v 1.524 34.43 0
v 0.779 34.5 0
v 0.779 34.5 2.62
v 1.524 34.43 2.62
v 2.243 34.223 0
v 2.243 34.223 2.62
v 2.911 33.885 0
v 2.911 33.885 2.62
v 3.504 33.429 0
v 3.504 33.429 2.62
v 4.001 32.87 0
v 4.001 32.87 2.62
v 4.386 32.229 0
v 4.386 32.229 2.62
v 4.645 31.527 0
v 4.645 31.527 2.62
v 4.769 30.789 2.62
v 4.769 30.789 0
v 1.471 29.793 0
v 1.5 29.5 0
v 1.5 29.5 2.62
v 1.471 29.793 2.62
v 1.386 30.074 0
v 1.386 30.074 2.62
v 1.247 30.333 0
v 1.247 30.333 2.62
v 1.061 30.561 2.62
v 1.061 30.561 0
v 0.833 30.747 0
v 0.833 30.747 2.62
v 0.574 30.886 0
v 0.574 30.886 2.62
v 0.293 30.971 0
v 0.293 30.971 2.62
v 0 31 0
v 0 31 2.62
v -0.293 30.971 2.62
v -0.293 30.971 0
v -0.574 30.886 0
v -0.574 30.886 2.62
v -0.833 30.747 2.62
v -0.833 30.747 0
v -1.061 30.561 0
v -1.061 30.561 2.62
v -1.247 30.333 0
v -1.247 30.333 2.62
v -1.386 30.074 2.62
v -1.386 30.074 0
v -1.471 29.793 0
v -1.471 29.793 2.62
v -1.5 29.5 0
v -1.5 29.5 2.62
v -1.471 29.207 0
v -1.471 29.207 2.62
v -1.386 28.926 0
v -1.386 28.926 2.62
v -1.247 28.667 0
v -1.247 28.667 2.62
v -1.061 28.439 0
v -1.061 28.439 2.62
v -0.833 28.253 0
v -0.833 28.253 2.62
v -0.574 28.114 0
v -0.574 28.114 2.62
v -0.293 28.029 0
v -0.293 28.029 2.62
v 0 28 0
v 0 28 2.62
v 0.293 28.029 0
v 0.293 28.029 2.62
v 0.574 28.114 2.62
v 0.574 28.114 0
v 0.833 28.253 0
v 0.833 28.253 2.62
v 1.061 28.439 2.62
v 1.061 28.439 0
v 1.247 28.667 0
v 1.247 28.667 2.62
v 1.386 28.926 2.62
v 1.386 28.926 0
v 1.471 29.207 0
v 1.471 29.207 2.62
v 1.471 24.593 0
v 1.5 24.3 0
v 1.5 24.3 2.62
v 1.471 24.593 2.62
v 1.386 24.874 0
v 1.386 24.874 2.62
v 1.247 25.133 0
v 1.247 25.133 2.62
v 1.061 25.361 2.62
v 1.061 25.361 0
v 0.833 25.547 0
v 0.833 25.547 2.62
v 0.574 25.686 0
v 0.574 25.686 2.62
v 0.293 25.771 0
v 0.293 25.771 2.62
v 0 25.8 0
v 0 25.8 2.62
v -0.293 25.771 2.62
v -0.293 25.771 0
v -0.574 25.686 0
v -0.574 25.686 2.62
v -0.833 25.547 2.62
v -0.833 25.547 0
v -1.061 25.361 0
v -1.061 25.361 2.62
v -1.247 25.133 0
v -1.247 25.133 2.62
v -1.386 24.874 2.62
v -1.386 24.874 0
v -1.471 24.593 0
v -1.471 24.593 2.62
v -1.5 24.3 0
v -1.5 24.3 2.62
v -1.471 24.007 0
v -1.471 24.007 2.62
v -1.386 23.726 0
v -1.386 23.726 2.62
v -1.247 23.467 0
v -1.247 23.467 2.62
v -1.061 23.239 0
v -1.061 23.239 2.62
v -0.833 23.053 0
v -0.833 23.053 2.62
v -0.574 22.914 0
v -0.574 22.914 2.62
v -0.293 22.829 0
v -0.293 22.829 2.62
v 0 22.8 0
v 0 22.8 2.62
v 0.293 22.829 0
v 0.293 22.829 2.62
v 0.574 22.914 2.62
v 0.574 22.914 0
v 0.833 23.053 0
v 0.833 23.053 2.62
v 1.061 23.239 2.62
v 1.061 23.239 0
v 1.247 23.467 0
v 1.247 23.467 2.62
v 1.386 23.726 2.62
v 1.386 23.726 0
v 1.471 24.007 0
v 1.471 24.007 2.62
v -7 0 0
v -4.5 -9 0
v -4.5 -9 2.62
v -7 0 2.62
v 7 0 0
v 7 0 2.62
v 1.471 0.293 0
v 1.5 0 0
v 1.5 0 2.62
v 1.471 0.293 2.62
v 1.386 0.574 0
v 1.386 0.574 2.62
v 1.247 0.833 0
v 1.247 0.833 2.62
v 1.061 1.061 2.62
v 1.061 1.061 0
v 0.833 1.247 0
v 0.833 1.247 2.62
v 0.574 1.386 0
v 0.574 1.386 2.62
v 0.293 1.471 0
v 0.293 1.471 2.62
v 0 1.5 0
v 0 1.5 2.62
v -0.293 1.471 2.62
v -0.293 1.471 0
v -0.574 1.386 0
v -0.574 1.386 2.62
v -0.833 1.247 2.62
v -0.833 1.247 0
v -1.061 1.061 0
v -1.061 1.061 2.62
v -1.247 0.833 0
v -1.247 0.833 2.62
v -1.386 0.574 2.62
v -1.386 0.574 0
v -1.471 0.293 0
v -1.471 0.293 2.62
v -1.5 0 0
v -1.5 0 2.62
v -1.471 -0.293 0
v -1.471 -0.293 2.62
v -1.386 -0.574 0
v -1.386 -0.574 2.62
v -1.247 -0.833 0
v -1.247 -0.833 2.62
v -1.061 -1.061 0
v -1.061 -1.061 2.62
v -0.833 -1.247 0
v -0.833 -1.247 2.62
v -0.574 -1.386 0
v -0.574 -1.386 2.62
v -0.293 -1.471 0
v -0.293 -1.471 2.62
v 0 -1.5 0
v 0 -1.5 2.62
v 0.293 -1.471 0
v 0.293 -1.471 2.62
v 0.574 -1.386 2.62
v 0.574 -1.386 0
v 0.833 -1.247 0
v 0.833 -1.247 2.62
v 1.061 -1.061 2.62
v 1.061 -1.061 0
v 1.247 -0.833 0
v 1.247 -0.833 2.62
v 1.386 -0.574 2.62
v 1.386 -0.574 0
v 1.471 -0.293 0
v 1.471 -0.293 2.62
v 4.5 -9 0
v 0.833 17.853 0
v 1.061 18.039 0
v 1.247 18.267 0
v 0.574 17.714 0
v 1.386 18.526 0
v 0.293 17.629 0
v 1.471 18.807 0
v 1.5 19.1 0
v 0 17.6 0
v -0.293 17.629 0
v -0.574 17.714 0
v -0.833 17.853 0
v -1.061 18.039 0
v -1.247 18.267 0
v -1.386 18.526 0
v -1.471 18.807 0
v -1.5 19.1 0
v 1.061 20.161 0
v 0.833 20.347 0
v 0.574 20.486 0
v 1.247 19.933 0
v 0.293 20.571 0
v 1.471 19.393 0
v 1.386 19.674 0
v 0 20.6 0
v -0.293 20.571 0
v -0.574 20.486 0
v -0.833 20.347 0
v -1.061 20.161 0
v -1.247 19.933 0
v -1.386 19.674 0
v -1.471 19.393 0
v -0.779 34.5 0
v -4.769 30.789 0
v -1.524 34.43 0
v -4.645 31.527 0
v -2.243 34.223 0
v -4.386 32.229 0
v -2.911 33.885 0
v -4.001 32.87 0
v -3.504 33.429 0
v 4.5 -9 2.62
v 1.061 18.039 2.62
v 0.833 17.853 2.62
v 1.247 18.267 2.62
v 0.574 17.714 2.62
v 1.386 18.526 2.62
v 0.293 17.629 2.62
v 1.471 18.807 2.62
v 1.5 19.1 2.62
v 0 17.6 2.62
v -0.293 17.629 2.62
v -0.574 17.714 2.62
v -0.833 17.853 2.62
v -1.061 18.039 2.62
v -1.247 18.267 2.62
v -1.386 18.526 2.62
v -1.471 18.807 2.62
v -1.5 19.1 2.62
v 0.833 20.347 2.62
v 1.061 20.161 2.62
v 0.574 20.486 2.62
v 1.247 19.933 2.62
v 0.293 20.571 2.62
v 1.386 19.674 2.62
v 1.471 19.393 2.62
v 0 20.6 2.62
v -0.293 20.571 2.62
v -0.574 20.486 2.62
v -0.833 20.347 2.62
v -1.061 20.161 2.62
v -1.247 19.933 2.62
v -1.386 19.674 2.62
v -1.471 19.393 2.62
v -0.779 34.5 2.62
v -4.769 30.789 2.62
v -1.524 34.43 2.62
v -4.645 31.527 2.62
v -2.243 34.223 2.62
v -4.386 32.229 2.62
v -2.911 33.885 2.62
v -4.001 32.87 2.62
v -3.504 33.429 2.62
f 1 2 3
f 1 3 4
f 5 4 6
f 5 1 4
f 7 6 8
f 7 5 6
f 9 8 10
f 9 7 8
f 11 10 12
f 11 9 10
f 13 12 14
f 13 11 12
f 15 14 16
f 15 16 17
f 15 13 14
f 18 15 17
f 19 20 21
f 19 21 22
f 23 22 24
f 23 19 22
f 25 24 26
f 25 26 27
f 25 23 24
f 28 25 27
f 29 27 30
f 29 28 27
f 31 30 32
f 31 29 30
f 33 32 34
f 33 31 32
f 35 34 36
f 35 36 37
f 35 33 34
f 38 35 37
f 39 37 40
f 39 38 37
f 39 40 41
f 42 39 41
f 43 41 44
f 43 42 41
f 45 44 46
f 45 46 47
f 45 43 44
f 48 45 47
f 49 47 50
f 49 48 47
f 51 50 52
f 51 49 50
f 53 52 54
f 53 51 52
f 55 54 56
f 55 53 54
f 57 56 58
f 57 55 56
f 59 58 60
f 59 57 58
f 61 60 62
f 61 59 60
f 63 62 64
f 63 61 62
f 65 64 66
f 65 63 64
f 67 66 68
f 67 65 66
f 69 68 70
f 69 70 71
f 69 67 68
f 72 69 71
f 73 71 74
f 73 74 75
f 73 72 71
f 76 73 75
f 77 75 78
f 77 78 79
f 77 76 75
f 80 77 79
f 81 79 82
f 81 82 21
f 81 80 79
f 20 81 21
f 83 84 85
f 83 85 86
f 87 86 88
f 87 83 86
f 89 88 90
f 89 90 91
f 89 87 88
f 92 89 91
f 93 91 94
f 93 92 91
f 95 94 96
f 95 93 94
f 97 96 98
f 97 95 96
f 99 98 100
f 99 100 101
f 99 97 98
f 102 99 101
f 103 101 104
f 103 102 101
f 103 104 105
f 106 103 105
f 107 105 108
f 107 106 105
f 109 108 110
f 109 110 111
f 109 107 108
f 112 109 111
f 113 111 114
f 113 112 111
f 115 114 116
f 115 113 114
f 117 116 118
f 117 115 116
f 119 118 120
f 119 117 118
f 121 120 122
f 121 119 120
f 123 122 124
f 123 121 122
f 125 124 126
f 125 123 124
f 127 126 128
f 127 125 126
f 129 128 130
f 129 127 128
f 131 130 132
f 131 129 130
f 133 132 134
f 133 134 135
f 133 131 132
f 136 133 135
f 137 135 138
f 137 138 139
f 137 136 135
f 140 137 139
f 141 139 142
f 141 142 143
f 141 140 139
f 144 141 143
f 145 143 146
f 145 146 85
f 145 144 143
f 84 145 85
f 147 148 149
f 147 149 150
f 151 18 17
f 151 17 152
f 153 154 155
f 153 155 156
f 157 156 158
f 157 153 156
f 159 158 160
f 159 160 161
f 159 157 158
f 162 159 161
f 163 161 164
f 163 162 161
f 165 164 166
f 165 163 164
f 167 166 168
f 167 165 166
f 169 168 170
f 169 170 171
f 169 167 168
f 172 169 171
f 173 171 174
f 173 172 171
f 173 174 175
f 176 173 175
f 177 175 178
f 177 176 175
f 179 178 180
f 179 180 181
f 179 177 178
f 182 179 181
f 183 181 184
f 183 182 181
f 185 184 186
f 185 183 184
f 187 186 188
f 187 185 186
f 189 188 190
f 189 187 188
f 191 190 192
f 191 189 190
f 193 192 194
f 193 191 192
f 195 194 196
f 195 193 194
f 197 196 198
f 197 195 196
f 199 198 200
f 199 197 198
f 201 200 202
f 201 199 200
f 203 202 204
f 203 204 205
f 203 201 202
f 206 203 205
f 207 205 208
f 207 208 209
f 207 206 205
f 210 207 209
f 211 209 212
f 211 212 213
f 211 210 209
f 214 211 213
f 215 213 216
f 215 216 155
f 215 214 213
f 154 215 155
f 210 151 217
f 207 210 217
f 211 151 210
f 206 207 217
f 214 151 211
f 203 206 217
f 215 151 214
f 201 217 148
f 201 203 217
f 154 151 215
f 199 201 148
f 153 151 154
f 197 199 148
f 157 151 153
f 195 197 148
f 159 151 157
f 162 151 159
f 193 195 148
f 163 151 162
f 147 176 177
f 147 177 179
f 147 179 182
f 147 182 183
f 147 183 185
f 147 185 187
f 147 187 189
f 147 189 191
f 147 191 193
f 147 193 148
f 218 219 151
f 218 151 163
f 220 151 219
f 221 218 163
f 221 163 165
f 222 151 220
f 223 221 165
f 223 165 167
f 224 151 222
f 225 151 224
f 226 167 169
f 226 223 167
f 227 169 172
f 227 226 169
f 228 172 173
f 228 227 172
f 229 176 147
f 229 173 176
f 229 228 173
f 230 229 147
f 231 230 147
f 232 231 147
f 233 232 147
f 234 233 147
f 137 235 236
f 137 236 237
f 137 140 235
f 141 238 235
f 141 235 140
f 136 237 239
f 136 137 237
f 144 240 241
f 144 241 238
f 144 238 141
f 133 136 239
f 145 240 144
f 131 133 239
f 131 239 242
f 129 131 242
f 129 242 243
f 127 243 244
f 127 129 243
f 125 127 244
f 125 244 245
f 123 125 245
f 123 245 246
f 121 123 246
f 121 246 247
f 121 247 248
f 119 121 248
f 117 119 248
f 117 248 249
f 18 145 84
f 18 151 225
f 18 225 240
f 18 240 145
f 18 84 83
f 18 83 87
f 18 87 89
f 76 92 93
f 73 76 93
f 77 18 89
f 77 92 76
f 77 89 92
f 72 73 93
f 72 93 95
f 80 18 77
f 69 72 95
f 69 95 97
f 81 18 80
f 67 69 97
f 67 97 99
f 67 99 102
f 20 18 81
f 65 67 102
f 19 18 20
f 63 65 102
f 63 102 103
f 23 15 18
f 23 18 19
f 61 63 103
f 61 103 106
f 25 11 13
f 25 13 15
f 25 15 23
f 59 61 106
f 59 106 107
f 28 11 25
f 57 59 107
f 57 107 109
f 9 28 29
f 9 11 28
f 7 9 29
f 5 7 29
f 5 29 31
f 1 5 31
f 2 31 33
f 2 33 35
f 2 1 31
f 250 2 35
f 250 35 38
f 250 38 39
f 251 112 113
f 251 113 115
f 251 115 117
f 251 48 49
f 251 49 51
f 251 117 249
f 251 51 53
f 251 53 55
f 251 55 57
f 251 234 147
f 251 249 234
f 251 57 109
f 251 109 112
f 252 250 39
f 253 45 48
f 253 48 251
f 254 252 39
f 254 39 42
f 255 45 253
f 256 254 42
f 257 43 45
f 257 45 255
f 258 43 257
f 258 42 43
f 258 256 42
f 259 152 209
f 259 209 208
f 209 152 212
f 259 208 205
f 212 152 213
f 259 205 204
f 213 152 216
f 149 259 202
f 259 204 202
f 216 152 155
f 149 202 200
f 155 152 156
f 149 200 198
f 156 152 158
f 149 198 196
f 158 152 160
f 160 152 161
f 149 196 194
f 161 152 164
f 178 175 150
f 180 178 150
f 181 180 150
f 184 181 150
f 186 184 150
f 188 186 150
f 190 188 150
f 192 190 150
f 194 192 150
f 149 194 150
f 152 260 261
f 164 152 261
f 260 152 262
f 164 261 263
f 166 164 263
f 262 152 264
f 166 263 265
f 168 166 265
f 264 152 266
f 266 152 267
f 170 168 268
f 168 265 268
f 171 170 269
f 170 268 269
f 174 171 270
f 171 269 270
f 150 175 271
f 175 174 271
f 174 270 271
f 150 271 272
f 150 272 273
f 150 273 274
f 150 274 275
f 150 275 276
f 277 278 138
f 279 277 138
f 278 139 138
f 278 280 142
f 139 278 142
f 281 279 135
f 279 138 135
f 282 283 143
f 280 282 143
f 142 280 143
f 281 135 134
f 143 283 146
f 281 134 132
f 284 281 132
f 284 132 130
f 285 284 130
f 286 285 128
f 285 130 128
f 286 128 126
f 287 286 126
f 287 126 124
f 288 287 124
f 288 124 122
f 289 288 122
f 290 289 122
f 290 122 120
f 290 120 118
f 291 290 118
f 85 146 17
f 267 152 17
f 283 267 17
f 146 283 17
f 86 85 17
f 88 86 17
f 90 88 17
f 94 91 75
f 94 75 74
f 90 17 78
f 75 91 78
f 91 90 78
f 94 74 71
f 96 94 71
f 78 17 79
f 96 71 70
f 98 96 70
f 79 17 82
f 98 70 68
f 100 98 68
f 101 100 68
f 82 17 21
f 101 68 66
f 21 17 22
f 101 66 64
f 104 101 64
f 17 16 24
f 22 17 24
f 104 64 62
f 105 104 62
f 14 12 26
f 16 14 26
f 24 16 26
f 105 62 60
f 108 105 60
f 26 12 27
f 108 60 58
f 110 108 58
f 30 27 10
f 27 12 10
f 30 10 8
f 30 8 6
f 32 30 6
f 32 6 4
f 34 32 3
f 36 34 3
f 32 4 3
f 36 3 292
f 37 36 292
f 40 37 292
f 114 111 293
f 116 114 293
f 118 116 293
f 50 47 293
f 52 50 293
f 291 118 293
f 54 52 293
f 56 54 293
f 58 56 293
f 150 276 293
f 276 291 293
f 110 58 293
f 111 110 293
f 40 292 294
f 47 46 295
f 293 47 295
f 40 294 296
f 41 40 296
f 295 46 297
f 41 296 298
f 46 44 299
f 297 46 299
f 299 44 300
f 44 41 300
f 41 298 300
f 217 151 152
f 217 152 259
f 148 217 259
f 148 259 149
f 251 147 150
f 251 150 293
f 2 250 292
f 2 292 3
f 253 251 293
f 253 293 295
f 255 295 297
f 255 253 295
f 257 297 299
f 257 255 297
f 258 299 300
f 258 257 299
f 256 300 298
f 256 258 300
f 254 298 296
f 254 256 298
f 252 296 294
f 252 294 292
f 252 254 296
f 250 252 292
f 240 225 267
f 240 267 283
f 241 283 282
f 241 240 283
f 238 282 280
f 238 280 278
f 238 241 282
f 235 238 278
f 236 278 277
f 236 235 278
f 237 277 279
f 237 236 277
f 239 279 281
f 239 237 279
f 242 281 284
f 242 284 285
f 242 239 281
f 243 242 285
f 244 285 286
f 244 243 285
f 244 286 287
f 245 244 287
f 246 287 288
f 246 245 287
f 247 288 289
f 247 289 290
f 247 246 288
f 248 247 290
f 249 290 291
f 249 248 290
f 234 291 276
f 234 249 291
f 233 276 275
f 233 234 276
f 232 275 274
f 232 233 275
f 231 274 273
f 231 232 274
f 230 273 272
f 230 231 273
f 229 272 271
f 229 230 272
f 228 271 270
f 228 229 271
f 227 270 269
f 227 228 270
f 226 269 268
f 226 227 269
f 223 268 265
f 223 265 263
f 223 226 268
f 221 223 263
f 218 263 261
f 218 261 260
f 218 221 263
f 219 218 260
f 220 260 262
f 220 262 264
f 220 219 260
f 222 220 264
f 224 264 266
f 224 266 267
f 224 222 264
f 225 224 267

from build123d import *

# Parameters (mm, degrees)
SKETCH2_R           = 1.5
BOSS_EXTRUDE1_DEPTH = 2.62


with BuildPart() as part:
    # Sketch2 → Boss-Extrude1 (new body)
    with BuildSketch(Plane.XY):
        with BuildLine():
            Line((-0.779366827, 34.5), (0.779366827, 34.5))
            ThreePointArc((0.779366827, 34.5), (3.503665988, 33.428855422), (4.768906011, 30.789097042))
            Line((4.768906011, 30.789097042), (7, 0))
            Line((7, 0), (4.5, -9))
            Line((4.5, -9), (-4.5, -9))
            Line((-4.5, -9), (-7, 0))
            Line((-7, 0), (-4.768906011, 30.789097042))
            ThreePointArc((-4.768906011, 30.789097042), (-3.503665988, 33.428855422), (-0.779366827, 34.5))
        make_face()
        Circle(SKETCH2_R, mode=Mode.SUBTRACT)
        with Locations((0, 19.1)):
            Circle(SKETCH2_R, mode=Mode.SUBTRACT)
        with Locations((0, 24.3)):
            Circle(SKETCH2_R, mode=Mode.SUBTRACT)
        with Locations((0, 29.5)):
            Circle(SKETCH2_R, mode=Mode.SUBTRACT)
    extrude(amount=BOSS_EXTRUDE1_DEPTH)


solid = part.part
